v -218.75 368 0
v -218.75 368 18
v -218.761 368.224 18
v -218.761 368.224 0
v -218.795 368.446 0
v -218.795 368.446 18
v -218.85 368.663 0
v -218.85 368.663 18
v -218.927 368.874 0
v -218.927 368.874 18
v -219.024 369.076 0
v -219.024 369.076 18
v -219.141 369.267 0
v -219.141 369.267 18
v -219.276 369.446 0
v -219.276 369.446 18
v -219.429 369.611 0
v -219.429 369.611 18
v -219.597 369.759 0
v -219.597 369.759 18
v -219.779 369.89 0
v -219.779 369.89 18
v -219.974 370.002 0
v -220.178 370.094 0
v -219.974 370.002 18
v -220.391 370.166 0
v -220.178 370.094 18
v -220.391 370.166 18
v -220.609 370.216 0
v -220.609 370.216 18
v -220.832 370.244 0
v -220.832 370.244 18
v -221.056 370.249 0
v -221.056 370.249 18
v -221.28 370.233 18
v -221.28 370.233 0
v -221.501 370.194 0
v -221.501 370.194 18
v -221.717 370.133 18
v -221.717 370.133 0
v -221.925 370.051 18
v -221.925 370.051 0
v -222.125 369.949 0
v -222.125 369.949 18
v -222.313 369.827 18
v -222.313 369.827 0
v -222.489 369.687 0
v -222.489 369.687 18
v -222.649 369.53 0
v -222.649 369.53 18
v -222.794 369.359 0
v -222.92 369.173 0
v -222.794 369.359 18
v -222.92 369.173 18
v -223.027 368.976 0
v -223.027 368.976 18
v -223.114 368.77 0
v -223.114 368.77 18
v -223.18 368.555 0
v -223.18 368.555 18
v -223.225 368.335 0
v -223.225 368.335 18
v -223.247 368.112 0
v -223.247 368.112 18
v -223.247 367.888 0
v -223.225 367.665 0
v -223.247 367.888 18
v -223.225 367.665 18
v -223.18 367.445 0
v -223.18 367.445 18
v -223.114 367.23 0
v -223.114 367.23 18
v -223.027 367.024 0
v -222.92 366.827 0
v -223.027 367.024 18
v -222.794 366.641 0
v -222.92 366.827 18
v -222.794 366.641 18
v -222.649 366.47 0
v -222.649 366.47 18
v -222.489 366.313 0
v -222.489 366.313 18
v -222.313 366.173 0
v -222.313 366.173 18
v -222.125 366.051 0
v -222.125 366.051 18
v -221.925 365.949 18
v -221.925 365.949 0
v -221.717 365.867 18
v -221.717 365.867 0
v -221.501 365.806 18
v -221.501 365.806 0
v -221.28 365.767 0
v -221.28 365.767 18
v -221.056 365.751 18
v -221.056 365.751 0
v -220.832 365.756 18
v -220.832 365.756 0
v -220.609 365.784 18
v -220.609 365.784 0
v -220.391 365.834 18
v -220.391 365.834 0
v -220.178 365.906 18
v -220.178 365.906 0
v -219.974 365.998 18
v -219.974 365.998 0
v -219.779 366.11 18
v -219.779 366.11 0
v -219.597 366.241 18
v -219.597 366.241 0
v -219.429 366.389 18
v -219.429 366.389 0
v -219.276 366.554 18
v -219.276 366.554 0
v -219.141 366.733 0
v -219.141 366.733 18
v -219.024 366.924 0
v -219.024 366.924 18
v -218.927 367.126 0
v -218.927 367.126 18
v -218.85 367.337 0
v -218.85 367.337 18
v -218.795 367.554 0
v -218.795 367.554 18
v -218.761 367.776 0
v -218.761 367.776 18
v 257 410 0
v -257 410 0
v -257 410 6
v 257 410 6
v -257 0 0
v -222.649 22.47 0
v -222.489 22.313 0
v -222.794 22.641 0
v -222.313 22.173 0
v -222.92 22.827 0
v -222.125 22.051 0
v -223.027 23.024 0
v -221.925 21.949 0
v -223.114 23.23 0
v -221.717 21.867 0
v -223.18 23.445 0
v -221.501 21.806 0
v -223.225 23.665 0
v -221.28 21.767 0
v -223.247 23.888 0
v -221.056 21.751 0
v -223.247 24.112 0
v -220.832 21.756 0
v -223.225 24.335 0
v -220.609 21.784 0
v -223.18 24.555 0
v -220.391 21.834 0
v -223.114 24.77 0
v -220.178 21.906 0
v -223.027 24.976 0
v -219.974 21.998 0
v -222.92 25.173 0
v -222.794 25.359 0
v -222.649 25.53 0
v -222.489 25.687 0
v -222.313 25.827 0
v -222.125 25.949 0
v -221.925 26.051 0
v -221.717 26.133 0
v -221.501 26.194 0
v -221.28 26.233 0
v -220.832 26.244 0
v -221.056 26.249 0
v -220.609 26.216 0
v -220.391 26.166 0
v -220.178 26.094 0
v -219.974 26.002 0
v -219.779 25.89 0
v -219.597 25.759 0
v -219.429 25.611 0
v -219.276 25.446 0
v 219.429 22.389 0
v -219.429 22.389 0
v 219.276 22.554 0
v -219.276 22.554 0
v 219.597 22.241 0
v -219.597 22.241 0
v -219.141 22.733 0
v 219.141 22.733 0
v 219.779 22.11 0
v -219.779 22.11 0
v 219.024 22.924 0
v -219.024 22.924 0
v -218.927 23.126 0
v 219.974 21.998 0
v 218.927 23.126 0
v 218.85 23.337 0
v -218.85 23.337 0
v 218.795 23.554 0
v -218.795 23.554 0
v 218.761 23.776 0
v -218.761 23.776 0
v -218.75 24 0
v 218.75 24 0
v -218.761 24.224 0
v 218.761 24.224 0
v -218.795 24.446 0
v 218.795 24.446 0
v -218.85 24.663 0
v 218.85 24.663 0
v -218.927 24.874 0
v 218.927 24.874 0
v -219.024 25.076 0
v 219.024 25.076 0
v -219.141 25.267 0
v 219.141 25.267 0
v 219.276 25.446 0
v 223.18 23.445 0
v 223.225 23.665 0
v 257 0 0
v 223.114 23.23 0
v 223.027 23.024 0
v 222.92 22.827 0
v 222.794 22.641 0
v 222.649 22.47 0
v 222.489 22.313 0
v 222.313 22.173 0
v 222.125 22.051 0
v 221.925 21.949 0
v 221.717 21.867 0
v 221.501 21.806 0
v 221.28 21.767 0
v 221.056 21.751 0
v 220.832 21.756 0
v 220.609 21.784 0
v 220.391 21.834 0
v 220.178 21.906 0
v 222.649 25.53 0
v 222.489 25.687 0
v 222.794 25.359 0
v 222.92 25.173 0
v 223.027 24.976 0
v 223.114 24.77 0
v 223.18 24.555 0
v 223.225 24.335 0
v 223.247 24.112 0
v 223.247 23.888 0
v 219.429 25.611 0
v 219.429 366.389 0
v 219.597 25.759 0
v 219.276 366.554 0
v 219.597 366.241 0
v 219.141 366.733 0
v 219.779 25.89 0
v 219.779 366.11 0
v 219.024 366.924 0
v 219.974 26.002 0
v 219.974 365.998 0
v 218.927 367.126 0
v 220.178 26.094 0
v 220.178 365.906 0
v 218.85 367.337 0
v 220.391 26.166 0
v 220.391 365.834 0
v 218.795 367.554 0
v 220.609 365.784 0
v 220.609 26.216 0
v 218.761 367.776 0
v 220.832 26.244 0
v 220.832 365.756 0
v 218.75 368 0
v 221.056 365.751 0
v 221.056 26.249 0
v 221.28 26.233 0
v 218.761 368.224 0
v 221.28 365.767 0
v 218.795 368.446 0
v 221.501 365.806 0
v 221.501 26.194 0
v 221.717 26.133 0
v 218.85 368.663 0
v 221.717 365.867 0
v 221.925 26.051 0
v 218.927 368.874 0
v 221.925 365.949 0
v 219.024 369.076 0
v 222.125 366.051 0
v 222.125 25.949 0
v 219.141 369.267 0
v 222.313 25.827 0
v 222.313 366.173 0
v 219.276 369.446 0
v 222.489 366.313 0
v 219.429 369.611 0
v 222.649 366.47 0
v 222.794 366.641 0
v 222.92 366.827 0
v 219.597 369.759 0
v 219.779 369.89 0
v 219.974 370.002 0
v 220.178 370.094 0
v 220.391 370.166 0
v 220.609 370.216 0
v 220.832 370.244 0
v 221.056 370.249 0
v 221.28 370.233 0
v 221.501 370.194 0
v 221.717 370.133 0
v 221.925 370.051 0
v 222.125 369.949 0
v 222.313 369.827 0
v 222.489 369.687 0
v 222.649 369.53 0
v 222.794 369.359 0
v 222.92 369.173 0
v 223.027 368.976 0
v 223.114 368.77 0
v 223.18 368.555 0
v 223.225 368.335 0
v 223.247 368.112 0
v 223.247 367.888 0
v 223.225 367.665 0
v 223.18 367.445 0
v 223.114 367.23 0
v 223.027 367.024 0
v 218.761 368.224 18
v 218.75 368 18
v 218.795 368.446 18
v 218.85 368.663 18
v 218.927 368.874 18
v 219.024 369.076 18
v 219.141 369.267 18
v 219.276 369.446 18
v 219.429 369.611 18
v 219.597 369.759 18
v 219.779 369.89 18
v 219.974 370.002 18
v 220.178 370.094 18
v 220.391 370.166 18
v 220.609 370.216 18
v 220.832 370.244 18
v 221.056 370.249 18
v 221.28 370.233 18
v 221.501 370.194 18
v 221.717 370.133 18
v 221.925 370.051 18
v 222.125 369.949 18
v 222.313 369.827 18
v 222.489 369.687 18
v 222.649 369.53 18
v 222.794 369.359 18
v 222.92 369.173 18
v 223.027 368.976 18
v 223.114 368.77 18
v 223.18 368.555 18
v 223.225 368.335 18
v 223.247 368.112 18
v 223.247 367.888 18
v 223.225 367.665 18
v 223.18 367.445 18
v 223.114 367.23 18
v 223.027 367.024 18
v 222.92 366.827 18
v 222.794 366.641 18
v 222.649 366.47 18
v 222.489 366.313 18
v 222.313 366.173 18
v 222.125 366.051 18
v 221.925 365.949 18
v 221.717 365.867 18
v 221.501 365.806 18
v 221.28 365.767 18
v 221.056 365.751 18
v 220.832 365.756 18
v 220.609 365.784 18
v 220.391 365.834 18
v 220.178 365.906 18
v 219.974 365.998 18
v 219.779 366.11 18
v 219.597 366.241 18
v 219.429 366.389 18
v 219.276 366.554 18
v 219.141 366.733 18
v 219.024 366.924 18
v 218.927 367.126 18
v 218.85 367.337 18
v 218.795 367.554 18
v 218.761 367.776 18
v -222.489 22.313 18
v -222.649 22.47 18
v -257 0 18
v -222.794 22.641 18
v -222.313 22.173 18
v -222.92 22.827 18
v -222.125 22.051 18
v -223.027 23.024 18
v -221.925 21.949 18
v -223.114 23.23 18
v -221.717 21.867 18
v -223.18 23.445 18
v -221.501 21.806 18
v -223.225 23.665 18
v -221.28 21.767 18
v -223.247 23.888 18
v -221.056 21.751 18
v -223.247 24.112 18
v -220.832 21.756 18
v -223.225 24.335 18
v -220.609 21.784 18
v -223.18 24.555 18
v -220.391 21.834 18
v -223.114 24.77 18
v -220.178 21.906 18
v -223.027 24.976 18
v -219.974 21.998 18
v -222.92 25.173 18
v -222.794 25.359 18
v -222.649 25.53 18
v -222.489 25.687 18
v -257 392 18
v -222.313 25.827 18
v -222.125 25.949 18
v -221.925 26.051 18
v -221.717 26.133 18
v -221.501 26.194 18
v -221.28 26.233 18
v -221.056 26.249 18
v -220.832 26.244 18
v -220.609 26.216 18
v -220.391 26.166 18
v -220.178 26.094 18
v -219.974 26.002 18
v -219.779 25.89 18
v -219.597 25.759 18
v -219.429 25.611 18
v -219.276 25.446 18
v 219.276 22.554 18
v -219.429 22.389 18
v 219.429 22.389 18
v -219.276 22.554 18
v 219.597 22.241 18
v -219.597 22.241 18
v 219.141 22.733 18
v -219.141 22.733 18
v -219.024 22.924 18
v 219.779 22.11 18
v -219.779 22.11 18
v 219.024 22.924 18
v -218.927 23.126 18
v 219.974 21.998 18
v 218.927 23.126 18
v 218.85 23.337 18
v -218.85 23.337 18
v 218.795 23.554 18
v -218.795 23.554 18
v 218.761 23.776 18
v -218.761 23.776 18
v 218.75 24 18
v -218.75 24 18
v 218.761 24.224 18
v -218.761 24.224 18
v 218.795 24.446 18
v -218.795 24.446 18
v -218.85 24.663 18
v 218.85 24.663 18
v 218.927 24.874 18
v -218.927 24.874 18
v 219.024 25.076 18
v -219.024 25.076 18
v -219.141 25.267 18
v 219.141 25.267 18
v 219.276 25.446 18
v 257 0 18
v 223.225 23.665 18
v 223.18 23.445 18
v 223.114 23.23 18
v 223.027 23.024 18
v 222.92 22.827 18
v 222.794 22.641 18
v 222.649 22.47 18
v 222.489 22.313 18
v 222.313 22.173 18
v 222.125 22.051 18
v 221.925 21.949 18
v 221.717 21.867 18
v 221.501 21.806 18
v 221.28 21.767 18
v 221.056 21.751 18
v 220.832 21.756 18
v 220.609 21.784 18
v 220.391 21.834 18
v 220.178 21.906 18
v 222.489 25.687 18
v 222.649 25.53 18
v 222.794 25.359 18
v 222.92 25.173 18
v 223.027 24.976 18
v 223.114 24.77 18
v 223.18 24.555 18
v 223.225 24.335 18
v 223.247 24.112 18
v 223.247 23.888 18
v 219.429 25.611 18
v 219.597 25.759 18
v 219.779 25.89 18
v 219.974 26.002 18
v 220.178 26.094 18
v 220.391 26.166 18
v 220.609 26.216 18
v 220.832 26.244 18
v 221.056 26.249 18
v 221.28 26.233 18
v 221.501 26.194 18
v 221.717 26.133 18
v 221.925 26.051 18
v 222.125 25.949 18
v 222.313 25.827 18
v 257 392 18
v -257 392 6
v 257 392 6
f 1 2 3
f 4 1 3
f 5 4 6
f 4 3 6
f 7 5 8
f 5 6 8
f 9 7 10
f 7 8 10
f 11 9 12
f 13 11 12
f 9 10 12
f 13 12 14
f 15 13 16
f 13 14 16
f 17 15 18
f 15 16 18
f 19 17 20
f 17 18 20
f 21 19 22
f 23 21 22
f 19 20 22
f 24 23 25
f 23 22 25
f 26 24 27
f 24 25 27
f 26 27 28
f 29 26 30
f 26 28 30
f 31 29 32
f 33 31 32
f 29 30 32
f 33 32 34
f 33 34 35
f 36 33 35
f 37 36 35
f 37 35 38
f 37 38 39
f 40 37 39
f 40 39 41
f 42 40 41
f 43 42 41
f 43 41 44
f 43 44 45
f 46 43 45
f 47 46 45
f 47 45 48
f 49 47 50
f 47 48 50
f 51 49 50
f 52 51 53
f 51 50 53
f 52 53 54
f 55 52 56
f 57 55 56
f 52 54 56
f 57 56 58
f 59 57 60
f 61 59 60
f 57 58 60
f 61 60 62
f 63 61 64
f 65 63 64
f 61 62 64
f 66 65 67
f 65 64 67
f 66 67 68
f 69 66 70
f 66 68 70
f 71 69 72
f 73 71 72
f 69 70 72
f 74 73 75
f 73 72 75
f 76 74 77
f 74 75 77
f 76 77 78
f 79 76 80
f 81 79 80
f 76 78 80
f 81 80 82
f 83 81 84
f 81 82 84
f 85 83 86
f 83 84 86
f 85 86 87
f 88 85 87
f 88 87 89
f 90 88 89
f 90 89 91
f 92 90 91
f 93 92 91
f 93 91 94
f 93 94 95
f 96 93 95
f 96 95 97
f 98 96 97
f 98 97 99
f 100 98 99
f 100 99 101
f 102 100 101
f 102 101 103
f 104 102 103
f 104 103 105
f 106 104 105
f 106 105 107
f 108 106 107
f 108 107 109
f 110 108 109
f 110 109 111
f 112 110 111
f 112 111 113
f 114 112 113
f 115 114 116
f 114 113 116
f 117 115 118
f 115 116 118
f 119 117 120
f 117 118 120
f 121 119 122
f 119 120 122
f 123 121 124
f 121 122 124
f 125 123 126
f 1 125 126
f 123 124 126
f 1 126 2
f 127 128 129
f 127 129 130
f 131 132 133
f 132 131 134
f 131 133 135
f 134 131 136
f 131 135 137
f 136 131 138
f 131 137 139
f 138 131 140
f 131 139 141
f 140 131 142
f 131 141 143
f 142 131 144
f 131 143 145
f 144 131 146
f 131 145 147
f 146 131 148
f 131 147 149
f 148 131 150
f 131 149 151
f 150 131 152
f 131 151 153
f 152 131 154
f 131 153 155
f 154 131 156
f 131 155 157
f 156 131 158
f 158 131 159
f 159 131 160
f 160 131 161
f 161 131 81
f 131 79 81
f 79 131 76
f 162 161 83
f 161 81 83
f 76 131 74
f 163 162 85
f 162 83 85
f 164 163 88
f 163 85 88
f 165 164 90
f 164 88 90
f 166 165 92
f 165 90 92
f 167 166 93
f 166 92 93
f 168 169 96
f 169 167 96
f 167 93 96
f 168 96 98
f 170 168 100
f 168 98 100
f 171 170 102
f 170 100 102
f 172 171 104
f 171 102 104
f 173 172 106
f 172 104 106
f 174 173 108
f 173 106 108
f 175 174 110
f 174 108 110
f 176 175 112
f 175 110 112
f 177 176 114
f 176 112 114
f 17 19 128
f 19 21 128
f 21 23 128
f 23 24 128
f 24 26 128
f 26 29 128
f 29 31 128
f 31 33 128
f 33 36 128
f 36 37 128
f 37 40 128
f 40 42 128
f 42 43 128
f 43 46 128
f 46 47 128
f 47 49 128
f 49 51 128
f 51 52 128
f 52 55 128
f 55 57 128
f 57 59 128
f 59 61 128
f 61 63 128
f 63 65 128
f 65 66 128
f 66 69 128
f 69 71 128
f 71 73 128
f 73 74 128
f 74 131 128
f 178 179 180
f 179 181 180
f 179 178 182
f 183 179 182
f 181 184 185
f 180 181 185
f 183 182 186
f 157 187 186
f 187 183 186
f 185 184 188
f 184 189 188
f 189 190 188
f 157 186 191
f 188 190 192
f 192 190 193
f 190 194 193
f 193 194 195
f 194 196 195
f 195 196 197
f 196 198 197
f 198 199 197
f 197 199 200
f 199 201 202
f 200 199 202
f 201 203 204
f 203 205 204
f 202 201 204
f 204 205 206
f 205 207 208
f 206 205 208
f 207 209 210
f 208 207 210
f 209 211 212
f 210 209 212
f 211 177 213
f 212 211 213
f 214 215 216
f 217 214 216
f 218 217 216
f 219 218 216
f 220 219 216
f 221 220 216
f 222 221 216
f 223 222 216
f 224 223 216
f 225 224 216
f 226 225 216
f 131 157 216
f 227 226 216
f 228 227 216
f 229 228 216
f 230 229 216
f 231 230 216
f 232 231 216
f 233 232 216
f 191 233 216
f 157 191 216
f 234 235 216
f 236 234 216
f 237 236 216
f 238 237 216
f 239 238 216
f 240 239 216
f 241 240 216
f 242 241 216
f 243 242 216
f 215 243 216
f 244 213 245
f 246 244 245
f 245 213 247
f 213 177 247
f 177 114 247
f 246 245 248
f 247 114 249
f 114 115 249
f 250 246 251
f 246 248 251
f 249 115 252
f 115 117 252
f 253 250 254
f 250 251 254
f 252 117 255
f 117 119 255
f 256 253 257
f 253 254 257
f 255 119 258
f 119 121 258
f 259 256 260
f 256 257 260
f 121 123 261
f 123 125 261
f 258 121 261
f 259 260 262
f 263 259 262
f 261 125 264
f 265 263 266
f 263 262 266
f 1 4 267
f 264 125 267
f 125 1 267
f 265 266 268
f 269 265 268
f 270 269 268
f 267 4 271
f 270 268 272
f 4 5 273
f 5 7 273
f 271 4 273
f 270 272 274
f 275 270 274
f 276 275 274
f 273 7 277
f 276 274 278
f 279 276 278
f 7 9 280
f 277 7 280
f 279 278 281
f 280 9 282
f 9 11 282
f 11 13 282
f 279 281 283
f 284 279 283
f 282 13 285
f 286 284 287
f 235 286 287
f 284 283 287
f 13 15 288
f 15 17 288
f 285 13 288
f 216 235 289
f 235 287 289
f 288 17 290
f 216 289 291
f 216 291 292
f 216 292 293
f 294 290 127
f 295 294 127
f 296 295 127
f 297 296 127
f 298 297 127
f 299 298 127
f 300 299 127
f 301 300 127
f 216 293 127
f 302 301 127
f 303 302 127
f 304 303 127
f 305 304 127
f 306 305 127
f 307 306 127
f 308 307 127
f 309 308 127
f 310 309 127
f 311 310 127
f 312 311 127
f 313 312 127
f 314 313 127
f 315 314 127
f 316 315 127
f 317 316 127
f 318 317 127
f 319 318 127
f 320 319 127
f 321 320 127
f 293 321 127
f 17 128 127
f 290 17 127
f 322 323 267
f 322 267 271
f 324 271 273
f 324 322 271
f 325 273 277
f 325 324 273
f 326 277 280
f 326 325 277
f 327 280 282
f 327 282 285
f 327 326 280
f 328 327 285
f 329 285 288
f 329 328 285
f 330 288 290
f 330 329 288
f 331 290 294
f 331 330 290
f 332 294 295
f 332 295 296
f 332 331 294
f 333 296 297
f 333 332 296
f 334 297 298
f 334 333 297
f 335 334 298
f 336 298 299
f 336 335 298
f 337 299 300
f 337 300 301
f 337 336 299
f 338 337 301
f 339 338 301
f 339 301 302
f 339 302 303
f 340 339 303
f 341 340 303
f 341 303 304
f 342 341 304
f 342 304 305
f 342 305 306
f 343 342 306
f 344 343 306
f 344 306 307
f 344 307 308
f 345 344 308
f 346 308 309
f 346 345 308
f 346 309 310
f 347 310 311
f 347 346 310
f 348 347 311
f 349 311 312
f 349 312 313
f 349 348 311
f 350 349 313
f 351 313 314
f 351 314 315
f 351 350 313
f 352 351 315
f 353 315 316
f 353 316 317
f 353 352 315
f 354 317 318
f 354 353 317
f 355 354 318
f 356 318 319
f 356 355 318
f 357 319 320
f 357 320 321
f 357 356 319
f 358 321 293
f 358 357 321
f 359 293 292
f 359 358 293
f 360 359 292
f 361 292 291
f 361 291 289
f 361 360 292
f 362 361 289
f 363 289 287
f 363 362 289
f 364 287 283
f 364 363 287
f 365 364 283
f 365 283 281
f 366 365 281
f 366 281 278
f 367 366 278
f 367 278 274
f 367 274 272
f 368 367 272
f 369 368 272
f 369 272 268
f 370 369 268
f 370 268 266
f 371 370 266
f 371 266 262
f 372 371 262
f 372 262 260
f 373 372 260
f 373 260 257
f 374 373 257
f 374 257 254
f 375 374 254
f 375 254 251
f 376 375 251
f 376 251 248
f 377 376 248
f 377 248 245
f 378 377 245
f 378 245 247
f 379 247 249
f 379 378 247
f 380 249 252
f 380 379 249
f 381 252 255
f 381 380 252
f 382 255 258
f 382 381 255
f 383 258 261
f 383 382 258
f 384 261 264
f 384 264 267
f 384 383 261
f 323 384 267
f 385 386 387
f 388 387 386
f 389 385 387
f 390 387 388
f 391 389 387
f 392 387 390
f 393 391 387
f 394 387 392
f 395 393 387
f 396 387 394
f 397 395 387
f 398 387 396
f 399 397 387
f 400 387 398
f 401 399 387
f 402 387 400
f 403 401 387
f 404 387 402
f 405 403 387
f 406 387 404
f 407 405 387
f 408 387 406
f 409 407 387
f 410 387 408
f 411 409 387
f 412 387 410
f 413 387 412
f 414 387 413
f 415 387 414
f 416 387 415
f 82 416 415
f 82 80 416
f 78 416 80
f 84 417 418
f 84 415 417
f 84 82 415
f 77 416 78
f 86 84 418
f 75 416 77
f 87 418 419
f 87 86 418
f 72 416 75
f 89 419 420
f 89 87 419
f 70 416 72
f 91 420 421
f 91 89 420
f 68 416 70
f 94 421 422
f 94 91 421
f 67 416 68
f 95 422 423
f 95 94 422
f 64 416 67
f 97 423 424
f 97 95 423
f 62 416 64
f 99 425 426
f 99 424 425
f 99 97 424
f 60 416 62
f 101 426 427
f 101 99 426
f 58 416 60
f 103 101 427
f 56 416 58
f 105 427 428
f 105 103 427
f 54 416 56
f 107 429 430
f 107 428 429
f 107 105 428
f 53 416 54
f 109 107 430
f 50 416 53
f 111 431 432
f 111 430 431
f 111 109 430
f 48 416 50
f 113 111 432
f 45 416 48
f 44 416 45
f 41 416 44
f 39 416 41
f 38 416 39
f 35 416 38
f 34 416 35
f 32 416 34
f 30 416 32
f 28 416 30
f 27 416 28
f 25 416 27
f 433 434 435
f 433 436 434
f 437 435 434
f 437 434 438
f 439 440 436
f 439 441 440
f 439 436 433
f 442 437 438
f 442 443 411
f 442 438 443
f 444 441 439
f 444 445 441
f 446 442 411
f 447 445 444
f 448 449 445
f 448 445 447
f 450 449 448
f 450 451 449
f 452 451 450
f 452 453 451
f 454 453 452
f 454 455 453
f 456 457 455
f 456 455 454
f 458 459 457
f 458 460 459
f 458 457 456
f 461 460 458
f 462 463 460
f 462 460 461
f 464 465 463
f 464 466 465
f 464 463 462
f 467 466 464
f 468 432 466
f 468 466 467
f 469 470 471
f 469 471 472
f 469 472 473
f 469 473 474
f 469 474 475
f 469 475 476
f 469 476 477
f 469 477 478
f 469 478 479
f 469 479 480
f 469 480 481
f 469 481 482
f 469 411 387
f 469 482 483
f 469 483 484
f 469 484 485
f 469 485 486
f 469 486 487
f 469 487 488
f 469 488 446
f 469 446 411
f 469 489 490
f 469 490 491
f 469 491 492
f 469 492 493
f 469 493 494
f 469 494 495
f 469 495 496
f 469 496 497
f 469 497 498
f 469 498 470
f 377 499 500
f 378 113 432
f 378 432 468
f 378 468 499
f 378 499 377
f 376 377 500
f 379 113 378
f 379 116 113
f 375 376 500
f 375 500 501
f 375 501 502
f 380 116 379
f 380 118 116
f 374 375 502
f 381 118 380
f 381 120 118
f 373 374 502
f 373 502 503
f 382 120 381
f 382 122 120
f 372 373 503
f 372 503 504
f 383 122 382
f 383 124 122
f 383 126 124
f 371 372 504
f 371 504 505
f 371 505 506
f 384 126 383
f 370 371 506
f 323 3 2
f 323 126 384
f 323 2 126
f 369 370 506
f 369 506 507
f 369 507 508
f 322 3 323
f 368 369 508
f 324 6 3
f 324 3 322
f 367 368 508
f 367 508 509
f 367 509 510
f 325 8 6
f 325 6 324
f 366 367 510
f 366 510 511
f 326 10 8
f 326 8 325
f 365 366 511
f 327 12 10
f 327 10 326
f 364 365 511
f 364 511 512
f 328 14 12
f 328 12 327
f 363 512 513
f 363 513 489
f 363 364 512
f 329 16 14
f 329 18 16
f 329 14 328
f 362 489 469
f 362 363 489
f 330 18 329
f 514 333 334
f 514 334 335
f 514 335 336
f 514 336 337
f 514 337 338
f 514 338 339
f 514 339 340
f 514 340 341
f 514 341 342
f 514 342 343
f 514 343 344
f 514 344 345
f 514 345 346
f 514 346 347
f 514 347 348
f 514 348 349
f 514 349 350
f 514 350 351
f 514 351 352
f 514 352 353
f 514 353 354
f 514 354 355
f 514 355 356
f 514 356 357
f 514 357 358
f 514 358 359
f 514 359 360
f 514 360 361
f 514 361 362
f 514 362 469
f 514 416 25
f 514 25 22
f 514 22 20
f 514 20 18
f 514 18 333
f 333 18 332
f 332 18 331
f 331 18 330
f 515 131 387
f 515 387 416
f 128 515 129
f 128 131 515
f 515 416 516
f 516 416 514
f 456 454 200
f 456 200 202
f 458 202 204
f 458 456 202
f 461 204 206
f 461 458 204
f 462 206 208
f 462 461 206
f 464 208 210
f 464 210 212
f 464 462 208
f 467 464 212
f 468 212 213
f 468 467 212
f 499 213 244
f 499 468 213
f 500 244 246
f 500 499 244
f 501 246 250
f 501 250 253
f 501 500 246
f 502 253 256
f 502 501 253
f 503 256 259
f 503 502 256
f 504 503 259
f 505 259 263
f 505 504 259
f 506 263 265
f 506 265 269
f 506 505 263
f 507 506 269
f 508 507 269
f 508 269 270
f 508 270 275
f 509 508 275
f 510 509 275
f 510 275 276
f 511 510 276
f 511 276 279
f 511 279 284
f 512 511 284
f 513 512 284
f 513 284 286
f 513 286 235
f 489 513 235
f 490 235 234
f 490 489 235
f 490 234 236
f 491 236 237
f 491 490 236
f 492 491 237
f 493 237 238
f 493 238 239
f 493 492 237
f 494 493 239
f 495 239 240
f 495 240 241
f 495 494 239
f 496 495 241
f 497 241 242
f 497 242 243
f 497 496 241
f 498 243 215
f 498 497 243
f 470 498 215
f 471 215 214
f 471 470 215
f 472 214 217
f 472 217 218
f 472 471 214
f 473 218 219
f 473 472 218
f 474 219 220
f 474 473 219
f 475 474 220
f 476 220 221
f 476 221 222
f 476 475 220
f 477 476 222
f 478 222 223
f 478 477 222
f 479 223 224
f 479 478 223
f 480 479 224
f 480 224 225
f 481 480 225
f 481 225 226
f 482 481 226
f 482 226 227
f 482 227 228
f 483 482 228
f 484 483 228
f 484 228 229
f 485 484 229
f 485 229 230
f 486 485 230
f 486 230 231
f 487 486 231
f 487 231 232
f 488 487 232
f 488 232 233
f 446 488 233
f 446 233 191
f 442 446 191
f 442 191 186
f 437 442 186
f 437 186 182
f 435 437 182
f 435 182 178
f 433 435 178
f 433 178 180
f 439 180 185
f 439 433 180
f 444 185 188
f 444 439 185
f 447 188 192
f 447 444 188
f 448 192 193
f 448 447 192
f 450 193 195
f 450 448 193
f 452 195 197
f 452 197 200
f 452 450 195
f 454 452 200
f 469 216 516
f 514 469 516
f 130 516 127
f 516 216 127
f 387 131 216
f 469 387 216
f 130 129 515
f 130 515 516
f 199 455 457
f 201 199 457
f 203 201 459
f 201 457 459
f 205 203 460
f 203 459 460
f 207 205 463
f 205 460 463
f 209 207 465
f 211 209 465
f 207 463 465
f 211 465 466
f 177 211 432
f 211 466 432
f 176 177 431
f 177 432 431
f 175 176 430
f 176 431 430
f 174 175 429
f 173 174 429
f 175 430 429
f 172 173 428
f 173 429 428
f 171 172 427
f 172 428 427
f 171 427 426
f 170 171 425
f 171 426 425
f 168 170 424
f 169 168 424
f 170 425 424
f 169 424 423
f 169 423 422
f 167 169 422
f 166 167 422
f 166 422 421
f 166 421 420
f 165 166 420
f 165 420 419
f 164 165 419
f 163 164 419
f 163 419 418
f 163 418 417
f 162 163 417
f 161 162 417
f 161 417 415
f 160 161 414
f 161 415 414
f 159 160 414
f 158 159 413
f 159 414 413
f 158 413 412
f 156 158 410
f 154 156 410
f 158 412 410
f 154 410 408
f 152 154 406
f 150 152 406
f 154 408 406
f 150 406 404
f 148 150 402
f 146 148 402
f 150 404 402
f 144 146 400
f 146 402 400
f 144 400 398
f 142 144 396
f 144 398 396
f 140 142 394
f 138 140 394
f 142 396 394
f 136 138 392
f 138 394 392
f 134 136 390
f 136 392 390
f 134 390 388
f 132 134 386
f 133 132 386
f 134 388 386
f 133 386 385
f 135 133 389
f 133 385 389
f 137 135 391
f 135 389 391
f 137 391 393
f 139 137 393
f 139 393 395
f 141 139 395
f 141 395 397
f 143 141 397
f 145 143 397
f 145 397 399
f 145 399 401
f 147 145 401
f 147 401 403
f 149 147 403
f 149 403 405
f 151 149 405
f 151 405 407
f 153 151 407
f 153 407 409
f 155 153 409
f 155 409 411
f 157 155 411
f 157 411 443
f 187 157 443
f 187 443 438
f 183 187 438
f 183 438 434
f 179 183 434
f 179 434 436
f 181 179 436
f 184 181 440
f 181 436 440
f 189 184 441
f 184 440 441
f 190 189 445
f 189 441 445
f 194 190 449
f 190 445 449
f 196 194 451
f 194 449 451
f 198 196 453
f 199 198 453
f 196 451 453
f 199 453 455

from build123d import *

# Parameters (mm, degrees)
SKETCH043_W     = 514
SKETCH043_H     = 410
PAD016_DEPTH    = 18
SKETCH044_W     = 514
SKETCH044_H     = 18
POCKET027_DEPTH = 12
SKETCH045_R     = 2.25
POCKET028_DEPTH = 18


with BuildPart() as part:
    # Sketch043 → Pad016 (new body)
    with BuildSketch(Plane.XY):
        with Locations((0, 205)):
            Rectangle(SKETCH043_W, SKETCH043_H)
    extrude(amount=PAD016_DEPTH)

    # Sketch044 (on Face6 of Pad016) → Pocket027 (cut)
    with BuildSketch(Plane.XY.offset(18)):
        with Locations((0, 401)):
            Rectangle(SKETCH044_W, SKETCH044_H)
    extrude(amount=-POCKET027_DEPTH, mode=Mode.SUBTRACT)

    # Sketch045 (on Face7 of Pocket027) → Pocket028 (cut)
    with BuildSketch(Plane.XY.offset(18)):
        with Locations((-221, 24)):
            Circle(SKETCH045_R)
        with Locations((-221, 368)):
            Circle(SKETCH045_R)
    pocket028 = extrude(amount=-POCKET028_DEPTH, mode=Mode.SUBTRACT)

    # Mirrored010: Pocket028 across Sketch045 V_Axis
    add(pocket028.mirror(Plane(origin=(0, 0, 18), x_dir=(0, 0, 1), z_dir=(1, 0, 0))), mode=Mode.SUBTRACT)


solid = part.part
